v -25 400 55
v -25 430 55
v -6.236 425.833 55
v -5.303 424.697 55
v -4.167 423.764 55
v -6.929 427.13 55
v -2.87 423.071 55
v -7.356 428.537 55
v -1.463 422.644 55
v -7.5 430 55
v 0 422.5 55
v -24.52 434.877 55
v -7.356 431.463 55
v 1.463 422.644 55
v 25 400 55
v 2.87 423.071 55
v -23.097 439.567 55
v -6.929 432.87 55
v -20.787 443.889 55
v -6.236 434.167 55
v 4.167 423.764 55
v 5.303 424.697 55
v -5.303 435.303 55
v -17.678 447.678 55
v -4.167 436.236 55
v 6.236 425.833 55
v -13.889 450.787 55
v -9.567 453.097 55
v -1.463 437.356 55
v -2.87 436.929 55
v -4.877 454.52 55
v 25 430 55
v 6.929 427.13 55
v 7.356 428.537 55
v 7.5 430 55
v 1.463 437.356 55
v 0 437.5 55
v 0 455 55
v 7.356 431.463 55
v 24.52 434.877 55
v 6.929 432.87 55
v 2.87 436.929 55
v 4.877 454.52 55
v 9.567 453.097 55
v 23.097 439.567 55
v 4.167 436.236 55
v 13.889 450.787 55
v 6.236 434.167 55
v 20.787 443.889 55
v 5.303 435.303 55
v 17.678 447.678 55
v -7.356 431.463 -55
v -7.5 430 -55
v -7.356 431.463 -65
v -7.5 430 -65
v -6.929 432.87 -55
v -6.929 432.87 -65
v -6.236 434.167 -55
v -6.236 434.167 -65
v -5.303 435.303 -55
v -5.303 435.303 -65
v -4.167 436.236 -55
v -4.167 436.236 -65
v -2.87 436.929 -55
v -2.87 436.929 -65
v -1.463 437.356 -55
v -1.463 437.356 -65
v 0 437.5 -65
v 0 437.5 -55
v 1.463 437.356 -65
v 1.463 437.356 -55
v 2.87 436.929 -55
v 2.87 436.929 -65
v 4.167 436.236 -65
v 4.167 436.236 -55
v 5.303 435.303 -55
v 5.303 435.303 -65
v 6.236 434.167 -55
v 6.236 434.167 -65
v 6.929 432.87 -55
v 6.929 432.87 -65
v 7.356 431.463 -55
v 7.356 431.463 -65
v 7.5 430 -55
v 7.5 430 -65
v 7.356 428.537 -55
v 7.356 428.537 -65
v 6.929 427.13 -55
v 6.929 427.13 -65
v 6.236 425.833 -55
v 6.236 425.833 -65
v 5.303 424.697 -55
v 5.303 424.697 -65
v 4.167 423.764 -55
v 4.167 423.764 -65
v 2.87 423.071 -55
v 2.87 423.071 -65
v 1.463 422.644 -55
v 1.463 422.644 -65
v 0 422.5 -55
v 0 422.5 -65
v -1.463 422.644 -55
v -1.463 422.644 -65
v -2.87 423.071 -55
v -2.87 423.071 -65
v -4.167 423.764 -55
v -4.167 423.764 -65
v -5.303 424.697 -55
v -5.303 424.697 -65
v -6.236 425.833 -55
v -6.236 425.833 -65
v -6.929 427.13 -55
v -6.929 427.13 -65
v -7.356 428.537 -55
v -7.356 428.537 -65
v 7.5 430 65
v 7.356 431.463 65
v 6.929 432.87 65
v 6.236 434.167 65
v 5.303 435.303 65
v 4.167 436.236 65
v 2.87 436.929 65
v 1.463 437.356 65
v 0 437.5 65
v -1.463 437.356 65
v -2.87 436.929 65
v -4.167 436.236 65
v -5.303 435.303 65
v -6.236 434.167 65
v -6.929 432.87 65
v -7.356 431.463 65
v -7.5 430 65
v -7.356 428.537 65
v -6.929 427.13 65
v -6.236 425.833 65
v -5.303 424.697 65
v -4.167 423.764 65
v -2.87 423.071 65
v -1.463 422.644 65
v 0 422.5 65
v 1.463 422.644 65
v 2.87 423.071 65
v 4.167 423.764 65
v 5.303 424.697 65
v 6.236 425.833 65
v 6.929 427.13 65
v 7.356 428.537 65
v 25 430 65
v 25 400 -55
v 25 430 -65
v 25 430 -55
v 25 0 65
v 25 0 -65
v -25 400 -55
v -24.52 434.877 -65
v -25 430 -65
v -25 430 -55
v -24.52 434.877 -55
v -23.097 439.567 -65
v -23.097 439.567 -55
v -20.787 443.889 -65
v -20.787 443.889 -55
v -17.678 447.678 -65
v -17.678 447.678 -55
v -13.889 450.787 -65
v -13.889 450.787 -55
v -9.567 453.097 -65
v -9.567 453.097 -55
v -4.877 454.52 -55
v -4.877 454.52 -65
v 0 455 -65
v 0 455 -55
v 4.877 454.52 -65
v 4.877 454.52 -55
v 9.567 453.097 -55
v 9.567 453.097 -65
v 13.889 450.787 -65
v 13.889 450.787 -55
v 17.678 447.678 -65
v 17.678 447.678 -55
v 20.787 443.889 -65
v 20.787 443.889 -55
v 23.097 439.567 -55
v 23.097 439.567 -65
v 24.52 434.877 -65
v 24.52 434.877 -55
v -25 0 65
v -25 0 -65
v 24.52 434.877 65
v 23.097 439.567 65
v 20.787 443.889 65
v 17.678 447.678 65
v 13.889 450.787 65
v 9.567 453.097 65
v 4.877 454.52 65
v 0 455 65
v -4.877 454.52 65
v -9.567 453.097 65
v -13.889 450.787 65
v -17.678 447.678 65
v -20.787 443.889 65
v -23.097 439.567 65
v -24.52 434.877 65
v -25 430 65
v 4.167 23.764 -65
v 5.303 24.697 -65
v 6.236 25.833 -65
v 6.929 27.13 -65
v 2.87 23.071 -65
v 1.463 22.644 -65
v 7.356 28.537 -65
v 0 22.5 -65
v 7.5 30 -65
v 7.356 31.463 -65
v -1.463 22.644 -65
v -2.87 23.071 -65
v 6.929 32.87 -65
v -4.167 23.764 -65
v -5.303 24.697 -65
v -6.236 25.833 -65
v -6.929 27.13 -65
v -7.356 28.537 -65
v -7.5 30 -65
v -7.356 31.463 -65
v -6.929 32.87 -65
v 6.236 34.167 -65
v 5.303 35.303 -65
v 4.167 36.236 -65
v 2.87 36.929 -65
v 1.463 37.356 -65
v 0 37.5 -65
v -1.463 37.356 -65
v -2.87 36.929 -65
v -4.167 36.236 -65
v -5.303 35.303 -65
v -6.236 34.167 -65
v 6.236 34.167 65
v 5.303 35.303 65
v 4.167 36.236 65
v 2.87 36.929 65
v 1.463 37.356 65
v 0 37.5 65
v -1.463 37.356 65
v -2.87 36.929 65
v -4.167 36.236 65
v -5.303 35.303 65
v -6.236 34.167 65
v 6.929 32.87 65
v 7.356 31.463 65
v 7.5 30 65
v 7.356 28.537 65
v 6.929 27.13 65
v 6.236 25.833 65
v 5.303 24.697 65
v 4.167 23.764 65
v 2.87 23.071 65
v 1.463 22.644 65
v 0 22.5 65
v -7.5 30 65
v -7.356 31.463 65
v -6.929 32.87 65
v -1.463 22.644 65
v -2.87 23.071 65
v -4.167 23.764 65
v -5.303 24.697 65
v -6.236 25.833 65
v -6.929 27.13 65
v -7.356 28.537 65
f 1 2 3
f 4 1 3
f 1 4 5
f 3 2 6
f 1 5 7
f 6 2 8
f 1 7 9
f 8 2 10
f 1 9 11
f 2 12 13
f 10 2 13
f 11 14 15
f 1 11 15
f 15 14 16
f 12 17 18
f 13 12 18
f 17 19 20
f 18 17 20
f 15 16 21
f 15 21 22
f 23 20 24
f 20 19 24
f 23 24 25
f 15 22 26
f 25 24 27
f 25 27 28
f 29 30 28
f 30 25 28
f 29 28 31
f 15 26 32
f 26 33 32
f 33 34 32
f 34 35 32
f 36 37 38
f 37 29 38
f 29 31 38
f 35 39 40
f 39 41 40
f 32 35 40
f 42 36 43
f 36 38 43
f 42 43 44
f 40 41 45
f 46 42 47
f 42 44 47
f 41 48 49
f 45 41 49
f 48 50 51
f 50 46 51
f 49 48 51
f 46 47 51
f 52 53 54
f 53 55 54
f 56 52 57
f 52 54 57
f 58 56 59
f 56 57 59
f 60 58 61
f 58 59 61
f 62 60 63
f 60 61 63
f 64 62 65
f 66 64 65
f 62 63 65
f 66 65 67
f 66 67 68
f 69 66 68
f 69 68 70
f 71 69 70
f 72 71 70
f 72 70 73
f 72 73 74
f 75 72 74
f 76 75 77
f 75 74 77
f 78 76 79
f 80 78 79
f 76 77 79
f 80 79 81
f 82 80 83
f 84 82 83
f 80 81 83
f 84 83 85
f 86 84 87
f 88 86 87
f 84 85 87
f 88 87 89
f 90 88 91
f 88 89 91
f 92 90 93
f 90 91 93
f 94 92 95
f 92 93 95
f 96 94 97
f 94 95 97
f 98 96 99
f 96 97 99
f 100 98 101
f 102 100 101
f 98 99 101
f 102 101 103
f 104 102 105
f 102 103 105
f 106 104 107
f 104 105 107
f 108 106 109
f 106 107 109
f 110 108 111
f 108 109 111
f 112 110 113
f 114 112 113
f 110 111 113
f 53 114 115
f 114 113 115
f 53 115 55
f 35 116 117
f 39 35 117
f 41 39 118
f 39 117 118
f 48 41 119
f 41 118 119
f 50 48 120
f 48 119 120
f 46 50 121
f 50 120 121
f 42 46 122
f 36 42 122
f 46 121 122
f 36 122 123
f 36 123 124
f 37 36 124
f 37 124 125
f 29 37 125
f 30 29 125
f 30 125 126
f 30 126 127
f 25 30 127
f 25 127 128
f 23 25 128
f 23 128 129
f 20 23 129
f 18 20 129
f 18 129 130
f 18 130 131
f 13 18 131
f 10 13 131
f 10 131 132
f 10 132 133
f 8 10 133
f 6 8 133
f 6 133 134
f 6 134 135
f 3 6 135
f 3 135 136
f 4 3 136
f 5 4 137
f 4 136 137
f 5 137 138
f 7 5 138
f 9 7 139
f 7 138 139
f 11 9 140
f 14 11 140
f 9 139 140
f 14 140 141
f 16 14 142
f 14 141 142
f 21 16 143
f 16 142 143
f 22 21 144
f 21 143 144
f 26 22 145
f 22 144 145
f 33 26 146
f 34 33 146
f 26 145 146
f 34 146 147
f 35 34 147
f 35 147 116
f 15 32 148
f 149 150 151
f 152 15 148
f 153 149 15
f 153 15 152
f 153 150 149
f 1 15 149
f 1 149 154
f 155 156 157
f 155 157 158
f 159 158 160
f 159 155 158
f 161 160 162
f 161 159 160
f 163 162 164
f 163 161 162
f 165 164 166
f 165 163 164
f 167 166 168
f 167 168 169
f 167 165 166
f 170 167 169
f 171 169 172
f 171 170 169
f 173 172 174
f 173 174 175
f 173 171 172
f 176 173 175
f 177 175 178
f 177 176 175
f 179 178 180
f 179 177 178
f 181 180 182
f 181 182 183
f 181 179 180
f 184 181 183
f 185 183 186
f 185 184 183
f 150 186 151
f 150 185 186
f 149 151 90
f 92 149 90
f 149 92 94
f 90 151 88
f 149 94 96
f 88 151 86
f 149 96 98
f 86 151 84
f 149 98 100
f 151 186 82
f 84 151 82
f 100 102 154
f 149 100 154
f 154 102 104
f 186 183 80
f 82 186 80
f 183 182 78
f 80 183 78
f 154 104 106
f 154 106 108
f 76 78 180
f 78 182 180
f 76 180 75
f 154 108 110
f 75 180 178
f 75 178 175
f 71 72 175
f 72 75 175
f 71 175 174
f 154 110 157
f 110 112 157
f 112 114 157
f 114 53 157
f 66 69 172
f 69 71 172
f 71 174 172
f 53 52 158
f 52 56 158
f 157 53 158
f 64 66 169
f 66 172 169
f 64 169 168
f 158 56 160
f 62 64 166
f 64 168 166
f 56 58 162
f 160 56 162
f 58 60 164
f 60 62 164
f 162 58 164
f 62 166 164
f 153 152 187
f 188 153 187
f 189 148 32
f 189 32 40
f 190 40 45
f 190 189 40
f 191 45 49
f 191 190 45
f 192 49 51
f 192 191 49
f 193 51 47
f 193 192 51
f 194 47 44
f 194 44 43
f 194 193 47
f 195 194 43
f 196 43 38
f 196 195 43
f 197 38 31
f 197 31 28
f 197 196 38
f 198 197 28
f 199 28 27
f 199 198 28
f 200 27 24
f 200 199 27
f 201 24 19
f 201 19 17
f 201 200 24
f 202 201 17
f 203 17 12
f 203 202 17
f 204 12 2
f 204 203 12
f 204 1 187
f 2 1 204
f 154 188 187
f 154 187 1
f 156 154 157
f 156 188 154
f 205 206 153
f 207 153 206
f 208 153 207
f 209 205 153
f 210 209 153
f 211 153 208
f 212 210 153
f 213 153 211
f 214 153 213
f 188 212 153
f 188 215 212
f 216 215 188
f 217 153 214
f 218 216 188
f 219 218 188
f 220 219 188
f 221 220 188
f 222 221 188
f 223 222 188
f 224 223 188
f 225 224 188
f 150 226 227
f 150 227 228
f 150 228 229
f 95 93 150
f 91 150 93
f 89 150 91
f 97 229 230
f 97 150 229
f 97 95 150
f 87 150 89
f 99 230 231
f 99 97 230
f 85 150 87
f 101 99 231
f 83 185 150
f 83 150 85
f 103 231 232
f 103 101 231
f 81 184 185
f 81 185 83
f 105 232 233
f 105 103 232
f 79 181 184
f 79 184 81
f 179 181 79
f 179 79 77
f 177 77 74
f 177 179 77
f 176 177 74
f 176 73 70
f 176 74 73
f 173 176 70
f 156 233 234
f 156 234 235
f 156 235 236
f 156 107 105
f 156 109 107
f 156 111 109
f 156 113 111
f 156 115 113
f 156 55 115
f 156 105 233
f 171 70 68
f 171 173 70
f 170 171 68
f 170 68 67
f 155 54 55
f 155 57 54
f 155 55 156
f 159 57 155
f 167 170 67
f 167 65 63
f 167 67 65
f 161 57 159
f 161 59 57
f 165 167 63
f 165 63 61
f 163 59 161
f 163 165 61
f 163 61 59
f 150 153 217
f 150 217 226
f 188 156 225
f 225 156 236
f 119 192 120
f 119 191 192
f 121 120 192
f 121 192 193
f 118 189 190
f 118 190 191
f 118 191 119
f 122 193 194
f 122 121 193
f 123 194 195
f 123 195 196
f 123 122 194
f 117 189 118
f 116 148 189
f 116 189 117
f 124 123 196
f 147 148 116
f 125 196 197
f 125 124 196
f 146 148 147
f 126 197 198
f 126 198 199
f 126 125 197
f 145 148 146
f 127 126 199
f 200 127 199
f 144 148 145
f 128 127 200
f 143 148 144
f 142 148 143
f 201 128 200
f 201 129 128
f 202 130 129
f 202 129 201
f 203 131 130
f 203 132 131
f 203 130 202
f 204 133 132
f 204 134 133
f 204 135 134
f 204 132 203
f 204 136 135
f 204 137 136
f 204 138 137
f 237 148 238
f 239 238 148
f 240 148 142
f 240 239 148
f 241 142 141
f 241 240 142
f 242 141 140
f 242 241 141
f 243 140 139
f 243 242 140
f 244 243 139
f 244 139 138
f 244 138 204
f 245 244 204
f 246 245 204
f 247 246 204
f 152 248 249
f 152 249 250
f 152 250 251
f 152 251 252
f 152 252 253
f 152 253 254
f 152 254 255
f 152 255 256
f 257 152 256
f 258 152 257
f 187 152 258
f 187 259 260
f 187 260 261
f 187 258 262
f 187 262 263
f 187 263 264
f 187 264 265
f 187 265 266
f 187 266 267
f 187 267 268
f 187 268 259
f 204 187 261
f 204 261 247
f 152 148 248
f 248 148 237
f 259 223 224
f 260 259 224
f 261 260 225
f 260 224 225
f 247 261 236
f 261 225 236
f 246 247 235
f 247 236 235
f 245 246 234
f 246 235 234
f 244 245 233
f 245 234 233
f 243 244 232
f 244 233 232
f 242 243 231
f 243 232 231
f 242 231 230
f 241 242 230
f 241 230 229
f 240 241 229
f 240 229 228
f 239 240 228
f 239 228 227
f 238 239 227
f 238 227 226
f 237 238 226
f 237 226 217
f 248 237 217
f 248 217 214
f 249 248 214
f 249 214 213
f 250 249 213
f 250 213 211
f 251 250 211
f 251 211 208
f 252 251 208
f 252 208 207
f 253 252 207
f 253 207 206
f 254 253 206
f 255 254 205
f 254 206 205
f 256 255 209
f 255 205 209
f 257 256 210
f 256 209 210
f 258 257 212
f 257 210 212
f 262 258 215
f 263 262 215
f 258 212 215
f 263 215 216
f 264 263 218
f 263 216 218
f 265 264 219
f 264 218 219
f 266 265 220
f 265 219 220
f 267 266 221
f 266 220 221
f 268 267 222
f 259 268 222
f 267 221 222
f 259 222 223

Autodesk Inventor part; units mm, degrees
ref_plane "YZ Plane" through (0, 0, 0) normal (1, 0, 0) x (0, 1, 0)
ref_plane "XZ Plane" through (0, 0, 0) normal (0, 1, 0) x (-1, 0, 0)
ref_plane "XY Plane" through (0, 0, 0) normal (0, 0, 1) x (1, 0, 0)
sketch "Boceto1" plane through (0, 0, 0) normal (0, 1, 0) x (-1, 0, 0)
  line L0 (-25, 65) -> (25, 65)
  line L1 (25, 65) -> (25, -65)
  line L2 (25, -65) -> (-25, -65)
  line L3 (-25, -65) -> (-25, 65)
  line L4 (-25, 65) -> (25, -65) construction
  line L5 (25, 65) -> (-25, -65) construction
  point P0 (0, 0)
  dimension "d0" = 50
  dimension "d1" = 130
extrude "Extrusión1" add sketch "Boceto1" along normal blind 400
sketch "Boceto2" plane through (-25, 0, 65) normal (0, 0, 1) x (1, 0, 0)
  line L0 (0, 400) -> (50, 400) projected
  line L1 (0, 400) -> (0, 430)
  line L2 (50, 400) -> (50, 430)
  arc A0 (50, 430) -> (0, 430) centre (25, 430) ccw
  circle A1 centre (25, 430) radius 7.5
  point P0 (25, 0)
  dimension "d4" = 30
  dimension "d5" = 30
  dimension "d6" = 15
extrude "Extrusión2" add sketch "Boceto2" against normal blind 10
sketch "Boceto3" plane through (25, 0, -65) normal (0, 0, -1) x (-1, 0, 0)
  arc A0 (50, 430) -> (0, 430) centre (25, 430) ccw projected
  circle A1 centre (25, 430) radius 7.5 projected
  line L0 (50, 400) -> (50, 430) projected
  line L1 (0, 400) -> (50, 400) projected
  line L2 (0, 430) -> (0, 400) projected
  point P0 (25, 0)
extrude "Extrusión3" add sketch "Boceto3" against normal blind 10
sketch "Boceto4" plane through (25, 0, -65) normal (0, 0, -1) x (-1, 0, 0)
  line L0 (25, 0) -> (25, 30)
  circle A0 centre (25, 30) radius 7.5
  dimension "d11" = 30
  dimension "d12" = 15
extrude "Extrusión4" cut sketch "Boceto4" against normal up to next
properties part number "brazo 1"
